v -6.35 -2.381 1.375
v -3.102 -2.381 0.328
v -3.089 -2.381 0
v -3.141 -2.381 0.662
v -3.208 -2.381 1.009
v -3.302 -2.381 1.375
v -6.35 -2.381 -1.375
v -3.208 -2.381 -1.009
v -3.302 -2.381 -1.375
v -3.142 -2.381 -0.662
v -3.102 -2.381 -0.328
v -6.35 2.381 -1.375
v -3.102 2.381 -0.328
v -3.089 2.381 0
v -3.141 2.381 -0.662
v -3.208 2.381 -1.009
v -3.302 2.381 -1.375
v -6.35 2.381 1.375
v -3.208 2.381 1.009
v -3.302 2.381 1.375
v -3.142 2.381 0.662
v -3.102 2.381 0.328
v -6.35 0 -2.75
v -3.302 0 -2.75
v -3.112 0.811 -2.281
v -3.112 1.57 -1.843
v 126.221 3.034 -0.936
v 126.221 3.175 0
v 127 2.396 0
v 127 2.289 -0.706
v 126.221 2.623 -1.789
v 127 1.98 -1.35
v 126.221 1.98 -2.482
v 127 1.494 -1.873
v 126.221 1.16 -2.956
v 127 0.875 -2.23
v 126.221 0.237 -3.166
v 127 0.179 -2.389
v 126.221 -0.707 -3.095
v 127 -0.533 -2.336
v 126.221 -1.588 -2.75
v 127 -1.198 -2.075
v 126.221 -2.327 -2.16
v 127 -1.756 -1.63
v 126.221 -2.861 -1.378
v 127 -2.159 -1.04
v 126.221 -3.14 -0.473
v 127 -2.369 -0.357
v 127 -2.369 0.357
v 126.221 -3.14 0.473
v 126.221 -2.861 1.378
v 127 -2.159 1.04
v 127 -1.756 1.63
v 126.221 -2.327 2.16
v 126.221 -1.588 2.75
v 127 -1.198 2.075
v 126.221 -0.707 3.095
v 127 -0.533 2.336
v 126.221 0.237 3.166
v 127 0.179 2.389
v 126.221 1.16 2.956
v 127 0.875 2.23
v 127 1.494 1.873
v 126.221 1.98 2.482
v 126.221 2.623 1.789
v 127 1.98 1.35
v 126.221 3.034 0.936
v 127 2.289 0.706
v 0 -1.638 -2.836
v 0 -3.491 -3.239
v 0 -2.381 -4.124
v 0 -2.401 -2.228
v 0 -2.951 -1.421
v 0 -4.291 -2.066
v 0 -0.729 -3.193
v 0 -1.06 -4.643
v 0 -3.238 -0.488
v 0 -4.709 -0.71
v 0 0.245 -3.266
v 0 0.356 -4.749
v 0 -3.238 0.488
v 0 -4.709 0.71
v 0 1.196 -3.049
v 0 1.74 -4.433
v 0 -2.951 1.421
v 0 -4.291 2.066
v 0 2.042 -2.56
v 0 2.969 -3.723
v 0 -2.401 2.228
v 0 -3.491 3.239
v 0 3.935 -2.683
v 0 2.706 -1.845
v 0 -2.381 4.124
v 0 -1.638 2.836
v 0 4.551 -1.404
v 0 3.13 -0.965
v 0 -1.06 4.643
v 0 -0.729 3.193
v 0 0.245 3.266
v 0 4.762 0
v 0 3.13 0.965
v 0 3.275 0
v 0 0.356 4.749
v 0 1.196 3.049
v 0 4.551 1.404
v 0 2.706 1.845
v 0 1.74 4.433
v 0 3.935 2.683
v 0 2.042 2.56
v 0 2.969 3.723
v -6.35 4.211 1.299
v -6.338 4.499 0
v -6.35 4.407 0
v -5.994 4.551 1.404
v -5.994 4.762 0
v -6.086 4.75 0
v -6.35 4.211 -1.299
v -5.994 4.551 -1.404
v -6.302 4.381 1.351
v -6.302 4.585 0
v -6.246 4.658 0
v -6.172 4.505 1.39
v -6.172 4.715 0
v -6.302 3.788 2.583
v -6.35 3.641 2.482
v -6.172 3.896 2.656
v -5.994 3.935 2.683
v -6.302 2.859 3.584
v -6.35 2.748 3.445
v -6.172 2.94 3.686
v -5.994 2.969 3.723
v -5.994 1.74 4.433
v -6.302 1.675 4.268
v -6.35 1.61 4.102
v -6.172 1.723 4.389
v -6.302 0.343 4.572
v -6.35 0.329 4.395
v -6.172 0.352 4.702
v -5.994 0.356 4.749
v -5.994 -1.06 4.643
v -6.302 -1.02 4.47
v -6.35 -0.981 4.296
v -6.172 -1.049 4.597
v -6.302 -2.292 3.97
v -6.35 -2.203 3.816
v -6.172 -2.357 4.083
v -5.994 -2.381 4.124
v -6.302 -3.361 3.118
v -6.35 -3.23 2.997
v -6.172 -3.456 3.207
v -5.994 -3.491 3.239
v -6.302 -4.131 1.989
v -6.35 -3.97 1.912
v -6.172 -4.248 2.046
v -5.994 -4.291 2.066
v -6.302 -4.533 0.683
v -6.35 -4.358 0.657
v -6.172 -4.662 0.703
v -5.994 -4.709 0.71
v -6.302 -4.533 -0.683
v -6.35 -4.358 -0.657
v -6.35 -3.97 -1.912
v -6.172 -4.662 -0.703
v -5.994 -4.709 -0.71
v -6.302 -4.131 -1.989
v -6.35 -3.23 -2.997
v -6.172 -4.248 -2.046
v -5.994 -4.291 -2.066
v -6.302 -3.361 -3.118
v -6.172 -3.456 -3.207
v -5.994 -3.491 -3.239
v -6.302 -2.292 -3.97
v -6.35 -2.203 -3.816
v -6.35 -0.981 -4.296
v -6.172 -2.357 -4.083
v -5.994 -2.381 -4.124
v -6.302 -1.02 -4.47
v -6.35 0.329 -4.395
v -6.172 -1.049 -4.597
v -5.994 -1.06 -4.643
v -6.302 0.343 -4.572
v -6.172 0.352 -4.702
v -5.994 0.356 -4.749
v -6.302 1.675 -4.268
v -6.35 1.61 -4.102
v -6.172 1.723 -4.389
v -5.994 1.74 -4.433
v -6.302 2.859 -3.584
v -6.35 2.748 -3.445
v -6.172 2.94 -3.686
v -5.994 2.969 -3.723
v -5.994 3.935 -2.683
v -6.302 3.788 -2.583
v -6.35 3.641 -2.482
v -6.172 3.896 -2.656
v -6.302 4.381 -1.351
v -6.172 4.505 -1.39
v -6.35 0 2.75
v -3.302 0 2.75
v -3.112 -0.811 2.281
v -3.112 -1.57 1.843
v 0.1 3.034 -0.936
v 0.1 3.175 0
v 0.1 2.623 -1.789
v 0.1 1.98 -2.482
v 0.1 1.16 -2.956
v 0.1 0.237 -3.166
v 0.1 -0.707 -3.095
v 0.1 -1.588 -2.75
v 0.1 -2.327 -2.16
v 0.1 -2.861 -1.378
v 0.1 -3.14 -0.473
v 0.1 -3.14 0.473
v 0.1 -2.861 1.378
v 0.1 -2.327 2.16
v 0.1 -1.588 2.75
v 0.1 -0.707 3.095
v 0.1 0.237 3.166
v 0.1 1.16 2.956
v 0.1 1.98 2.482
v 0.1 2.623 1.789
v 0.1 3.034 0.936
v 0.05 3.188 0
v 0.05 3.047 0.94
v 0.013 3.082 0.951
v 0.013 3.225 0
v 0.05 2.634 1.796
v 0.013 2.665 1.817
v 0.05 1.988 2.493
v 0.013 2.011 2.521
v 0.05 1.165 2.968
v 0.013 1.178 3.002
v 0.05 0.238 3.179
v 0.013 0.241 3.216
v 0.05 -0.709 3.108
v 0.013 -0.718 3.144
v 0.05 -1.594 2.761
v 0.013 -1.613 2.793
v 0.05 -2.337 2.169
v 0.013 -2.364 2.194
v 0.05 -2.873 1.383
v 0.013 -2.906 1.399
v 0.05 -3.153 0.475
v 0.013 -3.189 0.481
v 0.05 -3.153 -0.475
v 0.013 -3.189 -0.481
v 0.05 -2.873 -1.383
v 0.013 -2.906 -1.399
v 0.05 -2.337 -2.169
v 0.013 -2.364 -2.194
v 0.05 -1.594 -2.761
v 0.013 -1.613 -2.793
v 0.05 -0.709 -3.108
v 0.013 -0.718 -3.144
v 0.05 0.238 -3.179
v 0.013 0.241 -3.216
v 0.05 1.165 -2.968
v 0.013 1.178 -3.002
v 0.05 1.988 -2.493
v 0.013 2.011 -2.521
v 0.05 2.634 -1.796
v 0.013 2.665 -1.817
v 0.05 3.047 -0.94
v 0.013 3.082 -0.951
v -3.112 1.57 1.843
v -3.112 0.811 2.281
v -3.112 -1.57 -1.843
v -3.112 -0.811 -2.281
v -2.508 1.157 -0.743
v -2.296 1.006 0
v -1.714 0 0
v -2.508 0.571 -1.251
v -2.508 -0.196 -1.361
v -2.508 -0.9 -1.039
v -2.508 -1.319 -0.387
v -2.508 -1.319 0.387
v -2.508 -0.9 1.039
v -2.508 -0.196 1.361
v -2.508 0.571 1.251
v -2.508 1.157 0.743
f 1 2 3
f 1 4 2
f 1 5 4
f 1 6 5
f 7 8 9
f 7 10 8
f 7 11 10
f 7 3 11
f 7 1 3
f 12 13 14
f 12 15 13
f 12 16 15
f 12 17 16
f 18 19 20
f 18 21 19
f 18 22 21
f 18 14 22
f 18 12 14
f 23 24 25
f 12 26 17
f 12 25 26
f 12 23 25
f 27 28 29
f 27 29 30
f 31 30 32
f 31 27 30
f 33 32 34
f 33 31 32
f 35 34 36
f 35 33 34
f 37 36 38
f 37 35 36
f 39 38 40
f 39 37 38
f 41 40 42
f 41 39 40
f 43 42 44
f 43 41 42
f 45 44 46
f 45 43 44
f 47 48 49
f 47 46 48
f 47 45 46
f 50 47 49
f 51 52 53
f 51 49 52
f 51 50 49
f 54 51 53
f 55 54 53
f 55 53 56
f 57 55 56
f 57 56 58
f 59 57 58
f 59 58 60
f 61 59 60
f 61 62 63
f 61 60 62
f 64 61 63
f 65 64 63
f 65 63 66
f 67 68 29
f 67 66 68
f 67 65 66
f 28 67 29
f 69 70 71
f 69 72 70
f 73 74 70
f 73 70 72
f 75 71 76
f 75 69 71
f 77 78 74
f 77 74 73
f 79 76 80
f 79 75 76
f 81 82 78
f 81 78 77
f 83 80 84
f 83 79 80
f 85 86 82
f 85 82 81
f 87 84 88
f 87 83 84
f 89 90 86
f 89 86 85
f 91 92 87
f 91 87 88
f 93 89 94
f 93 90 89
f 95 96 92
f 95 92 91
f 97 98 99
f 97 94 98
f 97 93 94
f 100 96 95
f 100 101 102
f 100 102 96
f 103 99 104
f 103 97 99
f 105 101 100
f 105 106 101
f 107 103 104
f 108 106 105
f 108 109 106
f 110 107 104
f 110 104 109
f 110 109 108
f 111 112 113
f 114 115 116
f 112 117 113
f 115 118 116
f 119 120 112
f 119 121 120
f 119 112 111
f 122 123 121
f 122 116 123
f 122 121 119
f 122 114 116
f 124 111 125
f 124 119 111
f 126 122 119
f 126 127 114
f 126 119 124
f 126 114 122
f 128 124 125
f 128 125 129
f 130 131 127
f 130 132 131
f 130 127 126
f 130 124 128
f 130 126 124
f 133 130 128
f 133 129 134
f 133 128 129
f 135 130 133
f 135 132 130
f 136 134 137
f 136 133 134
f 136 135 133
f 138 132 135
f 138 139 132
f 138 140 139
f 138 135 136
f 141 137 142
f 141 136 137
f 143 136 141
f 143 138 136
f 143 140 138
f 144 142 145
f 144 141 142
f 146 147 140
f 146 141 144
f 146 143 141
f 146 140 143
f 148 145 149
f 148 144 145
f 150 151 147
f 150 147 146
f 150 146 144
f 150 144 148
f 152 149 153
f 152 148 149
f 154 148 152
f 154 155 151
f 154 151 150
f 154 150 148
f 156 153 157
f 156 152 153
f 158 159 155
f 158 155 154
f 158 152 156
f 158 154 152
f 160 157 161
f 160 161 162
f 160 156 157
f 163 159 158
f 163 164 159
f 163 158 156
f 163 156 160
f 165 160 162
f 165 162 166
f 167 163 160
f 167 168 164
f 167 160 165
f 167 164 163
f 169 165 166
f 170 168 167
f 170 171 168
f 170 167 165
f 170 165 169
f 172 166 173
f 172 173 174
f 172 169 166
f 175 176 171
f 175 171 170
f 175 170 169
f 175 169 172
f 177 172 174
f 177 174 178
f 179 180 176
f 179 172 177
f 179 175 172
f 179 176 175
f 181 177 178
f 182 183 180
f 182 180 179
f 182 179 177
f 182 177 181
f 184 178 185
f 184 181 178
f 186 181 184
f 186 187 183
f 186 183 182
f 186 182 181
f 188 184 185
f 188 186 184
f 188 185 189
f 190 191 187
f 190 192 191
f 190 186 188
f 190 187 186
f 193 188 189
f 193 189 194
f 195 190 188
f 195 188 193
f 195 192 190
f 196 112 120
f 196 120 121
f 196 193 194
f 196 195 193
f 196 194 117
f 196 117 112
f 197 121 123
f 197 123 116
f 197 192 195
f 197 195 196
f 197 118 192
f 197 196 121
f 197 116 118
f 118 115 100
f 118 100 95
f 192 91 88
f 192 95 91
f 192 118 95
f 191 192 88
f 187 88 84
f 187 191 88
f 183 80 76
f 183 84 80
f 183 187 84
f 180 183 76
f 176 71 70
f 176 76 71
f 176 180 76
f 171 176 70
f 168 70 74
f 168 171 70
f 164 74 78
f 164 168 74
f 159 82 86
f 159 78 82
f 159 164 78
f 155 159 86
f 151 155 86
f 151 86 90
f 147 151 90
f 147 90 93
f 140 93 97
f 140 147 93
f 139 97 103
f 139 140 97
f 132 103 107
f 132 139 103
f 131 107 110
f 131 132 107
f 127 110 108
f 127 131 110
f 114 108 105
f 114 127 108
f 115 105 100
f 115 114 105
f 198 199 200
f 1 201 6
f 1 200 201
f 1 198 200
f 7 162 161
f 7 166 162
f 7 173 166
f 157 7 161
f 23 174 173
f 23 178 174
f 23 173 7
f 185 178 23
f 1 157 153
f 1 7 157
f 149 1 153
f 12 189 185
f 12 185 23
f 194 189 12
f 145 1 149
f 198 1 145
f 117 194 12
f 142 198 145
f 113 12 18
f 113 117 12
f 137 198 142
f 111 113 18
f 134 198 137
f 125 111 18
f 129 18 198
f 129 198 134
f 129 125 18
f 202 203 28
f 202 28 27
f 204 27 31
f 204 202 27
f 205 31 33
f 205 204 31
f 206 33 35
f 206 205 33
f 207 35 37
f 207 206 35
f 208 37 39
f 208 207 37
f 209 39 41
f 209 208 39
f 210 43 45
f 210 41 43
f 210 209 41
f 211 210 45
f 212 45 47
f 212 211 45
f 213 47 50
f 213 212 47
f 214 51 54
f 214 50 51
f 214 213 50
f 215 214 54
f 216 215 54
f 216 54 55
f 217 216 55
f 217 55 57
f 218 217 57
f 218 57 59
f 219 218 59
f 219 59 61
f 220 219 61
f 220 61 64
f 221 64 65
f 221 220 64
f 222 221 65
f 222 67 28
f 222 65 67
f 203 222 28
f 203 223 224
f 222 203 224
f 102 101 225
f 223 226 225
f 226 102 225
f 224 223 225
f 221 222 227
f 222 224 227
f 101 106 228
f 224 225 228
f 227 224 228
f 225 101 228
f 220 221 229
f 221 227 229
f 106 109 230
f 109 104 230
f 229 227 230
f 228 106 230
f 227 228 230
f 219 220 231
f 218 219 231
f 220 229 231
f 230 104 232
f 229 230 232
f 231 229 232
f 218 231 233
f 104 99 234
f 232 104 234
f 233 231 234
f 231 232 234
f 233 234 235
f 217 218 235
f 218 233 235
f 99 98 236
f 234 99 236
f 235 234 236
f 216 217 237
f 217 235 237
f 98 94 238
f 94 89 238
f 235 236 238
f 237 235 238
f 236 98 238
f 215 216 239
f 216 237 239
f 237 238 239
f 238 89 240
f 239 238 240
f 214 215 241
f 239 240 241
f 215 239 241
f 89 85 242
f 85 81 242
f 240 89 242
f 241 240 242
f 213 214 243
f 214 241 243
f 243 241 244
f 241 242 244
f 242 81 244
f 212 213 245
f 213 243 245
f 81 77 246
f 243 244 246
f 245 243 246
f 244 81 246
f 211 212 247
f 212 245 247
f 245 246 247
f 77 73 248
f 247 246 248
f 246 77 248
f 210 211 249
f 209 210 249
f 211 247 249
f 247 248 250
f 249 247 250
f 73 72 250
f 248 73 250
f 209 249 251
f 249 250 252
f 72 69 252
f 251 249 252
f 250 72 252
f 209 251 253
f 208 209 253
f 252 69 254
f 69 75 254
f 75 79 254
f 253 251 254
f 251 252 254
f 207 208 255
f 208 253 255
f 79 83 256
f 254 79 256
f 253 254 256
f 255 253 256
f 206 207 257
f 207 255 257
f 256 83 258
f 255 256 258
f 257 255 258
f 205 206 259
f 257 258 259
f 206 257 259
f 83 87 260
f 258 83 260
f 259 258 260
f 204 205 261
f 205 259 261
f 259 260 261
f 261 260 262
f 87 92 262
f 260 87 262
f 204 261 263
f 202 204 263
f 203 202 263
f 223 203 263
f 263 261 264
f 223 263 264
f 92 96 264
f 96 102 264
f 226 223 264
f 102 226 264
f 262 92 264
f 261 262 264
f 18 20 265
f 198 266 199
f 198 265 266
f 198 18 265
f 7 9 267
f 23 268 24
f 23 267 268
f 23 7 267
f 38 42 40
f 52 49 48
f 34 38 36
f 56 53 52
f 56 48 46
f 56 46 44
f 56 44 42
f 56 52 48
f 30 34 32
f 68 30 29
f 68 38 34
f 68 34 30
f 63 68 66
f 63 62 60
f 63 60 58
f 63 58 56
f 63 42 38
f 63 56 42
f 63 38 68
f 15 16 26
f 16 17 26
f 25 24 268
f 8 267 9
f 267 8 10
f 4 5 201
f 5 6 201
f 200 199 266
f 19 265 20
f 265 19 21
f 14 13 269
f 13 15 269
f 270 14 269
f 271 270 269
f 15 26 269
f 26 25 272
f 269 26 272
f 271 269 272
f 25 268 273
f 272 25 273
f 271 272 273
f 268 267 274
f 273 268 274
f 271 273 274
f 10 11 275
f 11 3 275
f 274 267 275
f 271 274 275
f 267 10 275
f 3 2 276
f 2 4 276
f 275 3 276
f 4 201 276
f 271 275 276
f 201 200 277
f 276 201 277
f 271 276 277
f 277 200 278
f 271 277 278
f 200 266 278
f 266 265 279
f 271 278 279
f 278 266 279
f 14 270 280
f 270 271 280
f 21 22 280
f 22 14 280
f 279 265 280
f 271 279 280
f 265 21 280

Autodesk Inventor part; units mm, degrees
ref_plane "YZ Plane" through (0, 0, 0) normal (1, 0, 0) x (0, 1, 0)
ref_plane "XZ Plane" through (0, 0, 0) normal (0, 1, 0) x (-1, 0, 0)
sketch "Sketch1" plane through (0, 0, 0) normal (0, 0, 1) x (1, 0, 0)
  line L0 (-1.7145, 0) -> (127, 0)
  line L1 (127, 0) -> (127, 3.175)
  line L2 (127, 3.175) -> (101.6, 3.175)
  line L3 (101.6, 3.175) -> (99.0599, 3.175)
  line L4 (99.0599, 3.175) -> (0, 3.175)
  line L5 (0, 3.175) -> (0, 4.7625)
  line L6 (0, 4.7625) -> (-6.35, 4.7625)
  line L7 (-6.35, 4.7625) -> (-6.35, 2.7496)
  line L8 (-6.35, 2.7496) -> (-3.302, 2.7496)
  line L9 (-3.302, 2.7496) -> (-1.7145, 0)
  line L10 (-33.02, 0) -> (153.67, 0) projected
  line L11 (0, -0.9525) -> (0, 5.715) projected
  line L12 (101.6, 3.175) -> (0, 3.175) construction
  dimension "d1" = 25.4
  dimension "d2" = 2.5401
  dimension "d3" = 6.35
  dimension "d4" = 3.048
  dimension "d5" = 60
  dimension "d6" = 6.35
  dimension "d7" = 6.35
  dimension "d8" = 5.4993
  dimension "d9" = 9.525
  dimension "d26" = 127
revolve "Body" add sketch "Sketch1" angle 360 about axis through (-1.7145, 0, 0) along (1, 0, 0)
sketch "Sketch2" plane through (-6.35, 0, 0) normal (-1, 0, 0) x (0, 0, 1)
  circle A0 centre (0, 0) radius 2.7496 projected
  line L0 (0, -6.6675) -> (0, 6.6675) projected
  line L1 (-6.6675, 0) -> (6.6675, 0) projected
  line L2 (2.7496, 0) -> (1.3748, -2.3812)
  line L3 (1.3748, -2.3812) -> (-1.3748, -2.3813)
  line L4 (-1.3748, -2.3813) -> (-2.7496, 0)
  line L5 (-2.7496, 0) -> (-1.3748, 2.3812)
  line L6 (-1.3748, 2.3812) -> (1.3748, 2.3813)
  line L7 (1.3748, 2.3813) -> (2.7496, 0)
extrude "Slot" add sketch "Sketch2" against normal up to next contours L7 A0 | A0 L2 | L6 L0 A0 | A0 L0 L3 | L0 L6 A0 | A0 L3 L0 | L4 A0 | A0 L5
fillet "Fillet1" radius 0.3556 1 edges at (-6.35, -4.7625, 0)
thread "Thread" size "1/4-20 UNC" class "2A" standard "ANSI Unified Screw Threads" length 25.4
chamfer "Chamfer1" distance 0.7791 distance2 0.779 1 edges at (127, -3.175, 0) measured on face at (127, 0.9371, 0.4918)
ref_plane "Work Plane1" through (29, 0, 0) normal (0, -1, 0) x (1, 0, 0)
fillet "Fillet2" radius 0.1 1 edges at (0, -3.175, 0)
equation "\"d30\" = R"
equation "\"d17\" = RR"
equation "\"d13\" = GEL"
equation "\"d15\" = -0.5 * SPD + 0.5 * GD"
equation "\"d16\" = GUL"
equation "\"d1\" = GEL"
equation "\"d3\" = KOH"
equation "\"d4\" = INTI"
equation "\"d6\" = GD"
equation "\"d7\" = BDM"
equation "\"d8\" = 1.1547 * SW"
equation "\"d9\" = KOD"
equation "\"d26\" = NLG"
equation "\"GD\" = NND"
equation "\"NLG\" = 127"
equation "\"GEL\" = 25.4"
equation "\"KOD\" = 9.525"
equation "\"KOH\" = NND"
equation "\"INTI\" = 3.048"
equation "\"GAL\" = 2.54"
equation "\"GUL\" = 0.77902"
equation "\"BDM\" = NND"
equation "\"SW\" = 4.7625"
equation "\"RR\" = 0.3556"
equation "\"SPD\" = GD1"
equation "\"R\" = 0.1"
equation "\"PHH\" = 0.1 * NND"
equation "\"THREADDIA\" = 6.35"
equation "\"FAWI\" = 45deg"
equation "\"NND\" = 6.35"
equation "\"E0\" = 1.155 * SW"
equation "\"FAWI1\" = 30deg"
equation "\"TOA\" = 30deg"
equation "\"GD1\" = 4.79189"
properties part number "Unbrako - 1/4 x 5" material "Steel, Mild"
